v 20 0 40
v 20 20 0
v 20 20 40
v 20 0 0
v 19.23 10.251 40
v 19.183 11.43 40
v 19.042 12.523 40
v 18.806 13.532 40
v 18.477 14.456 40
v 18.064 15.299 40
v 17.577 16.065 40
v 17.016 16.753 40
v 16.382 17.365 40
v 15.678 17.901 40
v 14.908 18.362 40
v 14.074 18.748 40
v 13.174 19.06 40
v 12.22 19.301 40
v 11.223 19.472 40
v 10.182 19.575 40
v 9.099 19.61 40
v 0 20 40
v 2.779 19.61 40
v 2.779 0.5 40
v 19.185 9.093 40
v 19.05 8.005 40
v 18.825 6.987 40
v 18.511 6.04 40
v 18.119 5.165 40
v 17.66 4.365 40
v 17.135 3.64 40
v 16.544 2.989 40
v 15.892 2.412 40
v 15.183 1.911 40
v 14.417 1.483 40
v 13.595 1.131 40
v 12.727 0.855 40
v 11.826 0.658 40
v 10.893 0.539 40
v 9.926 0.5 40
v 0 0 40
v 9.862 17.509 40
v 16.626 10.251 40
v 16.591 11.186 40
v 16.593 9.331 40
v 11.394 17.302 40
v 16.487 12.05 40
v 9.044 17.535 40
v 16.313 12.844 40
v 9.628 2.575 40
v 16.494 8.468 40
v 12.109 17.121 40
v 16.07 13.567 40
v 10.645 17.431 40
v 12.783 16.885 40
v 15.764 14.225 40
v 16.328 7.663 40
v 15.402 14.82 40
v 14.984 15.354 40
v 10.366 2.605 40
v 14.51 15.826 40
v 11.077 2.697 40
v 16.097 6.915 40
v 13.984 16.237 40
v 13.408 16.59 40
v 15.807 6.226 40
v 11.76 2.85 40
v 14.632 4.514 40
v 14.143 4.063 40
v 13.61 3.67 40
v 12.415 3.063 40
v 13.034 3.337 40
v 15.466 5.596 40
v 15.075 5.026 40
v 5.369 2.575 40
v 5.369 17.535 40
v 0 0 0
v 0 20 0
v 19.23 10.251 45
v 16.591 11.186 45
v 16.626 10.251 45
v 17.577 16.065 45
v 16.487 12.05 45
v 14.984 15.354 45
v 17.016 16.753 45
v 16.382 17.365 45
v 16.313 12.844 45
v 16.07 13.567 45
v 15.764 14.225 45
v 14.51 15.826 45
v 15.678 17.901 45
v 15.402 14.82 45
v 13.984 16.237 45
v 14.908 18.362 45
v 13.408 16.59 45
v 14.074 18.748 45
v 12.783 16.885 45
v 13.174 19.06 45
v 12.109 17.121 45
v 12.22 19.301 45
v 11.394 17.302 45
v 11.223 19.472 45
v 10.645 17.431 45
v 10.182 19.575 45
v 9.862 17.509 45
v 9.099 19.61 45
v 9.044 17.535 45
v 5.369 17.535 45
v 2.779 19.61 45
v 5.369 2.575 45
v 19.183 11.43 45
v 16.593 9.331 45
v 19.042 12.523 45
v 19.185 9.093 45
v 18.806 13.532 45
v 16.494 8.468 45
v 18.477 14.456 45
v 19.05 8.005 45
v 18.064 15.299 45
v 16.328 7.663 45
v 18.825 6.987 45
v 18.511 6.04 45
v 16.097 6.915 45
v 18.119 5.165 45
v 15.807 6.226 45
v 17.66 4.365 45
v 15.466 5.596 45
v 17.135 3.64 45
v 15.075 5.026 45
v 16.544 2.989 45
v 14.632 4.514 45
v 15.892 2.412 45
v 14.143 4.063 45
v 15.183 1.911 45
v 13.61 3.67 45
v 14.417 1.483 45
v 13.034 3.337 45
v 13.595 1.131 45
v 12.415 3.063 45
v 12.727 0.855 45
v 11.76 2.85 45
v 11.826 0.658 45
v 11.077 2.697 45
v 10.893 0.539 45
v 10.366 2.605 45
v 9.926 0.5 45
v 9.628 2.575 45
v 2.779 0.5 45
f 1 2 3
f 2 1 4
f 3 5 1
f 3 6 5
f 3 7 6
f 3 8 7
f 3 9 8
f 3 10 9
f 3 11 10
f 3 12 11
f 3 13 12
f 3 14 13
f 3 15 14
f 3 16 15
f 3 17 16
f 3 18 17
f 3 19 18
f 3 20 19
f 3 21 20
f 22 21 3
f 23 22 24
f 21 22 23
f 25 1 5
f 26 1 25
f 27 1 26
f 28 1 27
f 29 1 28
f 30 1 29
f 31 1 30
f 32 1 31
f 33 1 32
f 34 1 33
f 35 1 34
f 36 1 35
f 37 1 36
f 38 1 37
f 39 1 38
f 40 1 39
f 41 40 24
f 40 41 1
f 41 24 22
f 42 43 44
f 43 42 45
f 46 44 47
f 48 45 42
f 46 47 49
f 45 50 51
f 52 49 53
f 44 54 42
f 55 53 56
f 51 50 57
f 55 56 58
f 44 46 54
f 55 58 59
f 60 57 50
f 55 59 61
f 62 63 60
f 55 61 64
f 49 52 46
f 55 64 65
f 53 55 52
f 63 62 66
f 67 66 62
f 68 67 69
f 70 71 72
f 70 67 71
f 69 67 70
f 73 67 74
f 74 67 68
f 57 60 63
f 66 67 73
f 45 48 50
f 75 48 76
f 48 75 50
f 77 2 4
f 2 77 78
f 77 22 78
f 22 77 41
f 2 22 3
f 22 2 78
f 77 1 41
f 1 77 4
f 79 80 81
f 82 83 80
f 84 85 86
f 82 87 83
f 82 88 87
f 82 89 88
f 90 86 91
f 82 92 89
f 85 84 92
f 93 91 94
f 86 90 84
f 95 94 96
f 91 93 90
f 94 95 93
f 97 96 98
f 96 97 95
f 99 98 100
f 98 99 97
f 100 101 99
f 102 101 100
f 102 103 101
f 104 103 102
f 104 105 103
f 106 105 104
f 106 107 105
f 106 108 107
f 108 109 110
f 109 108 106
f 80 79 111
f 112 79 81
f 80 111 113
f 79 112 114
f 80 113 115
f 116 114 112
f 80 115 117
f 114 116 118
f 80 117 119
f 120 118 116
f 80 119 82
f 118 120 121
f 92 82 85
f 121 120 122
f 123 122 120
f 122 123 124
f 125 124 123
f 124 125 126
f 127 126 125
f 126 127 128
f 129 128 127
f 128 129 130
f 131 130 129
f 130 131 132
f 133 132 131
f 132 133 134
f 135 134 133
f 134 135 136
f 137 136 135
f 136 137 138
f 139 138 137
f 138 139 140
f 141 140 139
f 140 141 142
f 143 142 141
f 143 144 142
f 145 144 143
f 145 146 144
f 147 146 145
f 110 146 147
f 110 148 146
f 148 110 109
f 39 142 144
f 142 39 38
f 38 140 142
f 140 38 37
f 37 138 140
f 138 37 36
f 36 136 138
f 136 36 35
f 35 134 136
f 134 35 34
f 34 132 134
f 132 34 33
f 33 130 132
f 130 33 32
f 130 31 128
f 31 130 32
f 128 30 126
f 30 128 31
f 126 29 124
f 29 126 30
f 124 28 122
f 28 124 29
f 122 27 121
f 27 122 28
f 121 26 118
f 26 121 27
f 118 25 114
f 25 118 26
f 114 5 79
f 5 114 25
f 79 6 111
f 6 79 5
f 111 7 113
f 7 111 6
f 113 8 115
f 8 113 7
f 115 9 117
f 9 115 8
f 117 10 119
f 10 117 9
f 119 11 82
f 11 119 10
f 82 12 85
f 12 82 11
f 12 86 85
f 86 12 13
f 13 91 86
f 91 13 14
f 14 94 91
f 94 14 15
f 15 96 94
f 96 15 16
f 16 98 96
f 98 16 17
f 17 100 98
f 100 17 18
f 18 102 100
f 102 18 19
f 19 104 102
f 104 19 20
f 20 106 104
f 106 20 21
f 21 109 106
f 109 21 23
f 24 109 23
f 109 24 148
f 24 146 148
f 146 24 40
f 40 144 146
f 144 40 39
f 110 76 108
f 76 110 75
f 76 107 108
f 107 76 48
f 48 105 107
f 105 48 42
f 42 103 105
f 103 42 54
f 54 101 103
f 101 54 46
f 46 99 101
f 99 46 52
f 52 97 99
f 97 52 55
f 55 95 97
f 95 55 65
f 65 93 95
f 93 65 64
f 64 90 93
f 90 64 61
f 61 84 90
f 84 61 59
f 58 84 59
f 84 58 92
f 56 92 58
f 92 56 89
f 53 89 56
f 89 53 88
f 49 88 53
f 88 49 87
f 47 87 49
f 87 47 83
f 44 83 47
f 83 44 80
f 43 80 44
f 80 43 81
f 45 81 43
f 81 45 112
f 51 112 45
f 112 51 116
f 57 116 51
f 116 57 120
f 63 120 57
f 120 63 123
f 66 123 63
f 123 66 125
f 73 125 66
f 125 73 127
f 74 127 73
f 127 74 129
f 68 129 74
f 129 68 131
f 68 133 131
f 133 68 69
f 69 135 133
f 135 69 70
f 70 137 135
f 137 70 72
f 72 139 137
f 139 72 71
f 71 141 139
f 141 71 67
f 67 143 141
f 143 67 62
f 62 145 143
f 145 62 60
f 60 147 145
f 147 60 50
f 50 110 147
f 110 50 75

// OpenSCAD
cube([20, 20, 40]);
translate([0.5, 0.5, 40]){
    linear_extrude(5){
        text("D", size=20);
    }
}
